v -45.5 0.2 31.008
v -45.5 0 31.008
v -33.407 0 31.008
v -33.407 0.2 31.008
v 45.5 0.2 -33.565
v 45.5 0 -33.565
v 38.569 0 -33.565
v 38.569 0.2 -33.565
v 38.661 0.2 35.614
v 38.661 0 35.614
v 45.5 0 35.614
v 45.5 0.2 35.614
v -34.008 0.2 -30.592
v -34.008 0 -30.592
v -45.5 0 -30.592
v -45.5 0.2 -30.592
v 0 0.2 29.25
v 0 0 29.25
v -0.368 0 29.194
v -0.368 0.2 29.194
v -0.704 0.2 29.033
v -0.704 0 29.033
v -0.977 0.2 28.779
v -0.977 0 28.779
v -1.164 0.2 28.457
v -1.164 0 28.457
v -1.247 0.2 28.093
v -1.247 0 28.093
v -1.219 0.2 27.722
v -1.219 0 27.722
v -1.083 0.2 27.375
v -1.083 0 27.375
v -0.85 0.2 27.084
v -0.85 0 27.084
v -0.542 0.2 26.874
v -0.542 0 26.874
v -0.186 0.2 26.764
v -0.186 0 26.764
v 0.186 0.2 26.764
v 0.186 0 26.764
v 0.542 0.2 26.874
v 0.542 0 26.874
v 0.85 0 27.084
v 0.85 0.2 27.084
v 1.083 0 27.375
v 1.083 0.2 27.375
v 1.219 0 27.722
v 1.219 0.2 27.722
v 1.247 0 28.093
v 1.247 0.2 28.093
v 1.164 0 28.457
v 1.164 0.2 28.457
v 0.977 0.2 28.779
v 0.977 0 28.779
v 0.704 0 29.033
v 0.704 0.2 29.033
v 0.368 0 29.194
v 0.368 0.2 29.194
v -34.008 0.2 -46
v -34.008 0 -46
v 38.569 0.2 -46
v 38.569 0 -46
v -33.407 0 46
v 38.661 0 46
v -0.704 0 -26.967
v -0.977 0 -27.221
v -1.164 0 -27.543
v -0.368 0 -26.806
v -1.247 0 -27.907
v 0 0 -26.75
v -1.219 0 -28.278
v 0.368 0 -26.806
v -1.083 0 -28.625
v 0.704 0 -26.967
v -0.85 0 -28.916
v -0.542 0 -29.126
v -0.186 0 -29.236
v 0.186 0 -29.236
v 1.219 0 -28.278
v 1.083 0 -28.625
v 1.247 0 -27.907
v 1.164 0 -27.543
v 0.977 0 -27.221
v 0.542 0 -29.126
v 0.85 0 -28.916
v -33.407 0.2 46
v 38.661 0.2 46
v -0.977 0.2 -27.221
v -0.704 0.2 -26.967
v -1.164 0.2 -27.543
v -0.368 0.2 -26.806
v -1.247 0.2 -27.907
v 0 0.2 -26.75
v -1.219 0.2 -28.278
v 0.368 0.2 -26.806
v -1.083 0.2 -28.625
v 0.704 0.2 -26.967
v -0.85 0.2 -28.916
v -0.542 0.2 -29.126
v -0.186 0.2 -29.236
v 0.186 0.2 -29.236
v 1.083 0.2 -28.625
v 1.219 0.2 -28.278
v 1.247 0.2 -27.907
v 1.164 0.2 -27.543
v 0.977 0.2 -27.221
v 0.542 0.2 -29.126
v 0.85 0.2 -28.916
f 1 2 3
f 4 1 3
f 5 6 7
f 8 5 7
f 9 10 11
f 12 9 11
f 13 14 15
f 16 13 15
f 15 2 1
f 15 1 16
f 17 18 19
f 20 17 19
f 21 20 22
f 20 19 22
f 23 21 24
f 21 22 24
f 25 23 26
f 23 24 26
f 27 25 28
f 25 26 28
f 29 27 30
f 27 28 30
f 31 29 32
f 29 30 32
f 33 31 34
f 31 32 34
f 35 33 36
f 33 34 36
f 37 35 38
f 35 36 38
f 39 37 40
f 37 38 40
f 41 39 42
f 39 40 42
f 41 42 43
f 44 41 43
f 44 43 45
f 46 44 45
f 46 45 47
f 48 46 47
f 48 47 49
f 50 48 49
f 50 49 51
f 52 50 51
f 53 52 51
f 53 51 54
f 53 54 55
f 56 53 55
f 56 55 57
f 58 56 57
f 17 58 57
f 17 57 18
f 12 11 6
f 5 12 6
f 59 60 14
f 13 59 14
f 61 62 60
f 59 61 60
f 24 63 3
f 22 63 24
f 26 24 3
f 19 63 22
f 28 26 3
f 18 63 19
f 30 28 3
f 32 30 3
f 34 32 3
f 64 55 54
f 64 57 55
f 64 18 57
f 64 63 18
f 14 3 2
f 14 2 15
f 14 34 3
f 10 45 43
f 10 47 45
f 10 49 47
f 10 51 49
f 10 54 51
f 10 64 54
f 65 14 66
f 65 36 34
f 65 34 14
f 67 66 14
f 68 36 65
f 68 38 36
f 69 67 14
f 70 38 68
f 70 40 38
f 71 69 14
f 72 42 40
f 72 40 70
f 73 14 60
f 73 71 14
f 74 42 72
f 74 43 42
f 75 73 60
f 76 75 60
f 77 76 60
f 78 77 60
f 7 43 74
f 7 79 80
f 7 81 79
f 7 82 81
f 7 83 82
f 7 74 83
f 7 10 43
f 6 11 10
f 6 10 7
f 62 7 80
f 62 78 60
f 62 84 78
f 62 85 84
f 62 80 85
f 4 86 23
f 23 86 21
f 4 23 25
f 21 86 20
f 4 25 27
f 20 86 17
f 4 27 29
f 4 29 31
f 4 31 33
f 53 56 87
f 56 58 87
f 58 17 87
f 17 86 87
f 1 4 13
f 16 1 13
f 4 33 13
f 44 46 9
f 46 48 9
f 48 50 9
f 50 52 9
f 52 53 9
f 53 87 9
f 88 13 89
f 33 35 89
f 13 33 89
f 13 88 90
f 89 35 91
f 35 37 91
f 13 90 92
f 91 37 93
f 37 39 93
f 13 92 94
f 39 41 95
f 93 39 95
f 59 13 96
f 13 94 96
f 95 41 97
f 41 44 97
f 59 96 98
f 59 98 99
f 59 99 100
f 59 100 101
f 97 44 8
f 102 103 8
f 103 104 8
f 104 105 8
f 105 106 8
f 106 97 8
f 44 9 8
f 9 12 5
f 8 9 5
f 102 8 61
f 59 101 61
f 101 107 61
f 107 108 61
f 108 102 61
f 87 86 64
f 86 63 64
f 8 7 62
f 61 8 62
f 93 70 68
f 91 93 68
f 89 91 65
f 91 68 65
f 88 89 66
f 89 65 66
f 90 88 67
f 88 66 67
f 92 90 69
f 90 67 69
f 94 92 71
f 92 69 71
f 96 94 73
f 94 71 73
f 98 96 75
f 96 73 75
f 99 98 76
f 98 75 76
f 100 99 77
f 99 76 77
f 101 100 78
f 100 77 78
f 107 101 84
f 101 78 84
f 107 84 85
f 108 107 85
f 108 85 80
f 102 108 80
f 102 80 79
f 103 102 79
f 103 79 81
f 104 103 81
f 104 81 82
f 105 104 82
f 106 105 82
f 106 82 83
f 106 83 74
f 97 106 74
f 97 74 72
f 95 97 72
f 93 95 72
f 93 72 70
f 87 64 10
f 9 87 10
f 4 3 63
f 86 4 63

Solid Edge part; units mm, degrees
sketch "Sketch1" plane through (0, 0, 0) normal (0, -1, 0) x (1, 0, 0)
  line L0 (-47, -47) -> (47, -47)
  line L1 (47, -47) -> (47, 47)
  line L2 (47, 47) -> (-47, 47)
  line L3 (-47, 47) -> (-47, -47)
  dimension "D1" = 47
  dimension "D2" = 47
  dimension "D3" = 47
  dimension "D4" = 47
extrude "Protrusion1" add sketch "Sketch1" against normal blind 0.2
sketch "Sketch2" plane through (0, 0.2, 0) normal (0, 1, 0) x (0, 0, -1)
  line L0 (-31.0077, 45.5) -> (-31.0077, 33.4066)
  line L1 (-31.0077, 33.4066) -> (-46, 33.4066)
  line L2 (-46, 33.4066) -> (-46, -38.6606)
  line L3 (-46, -38.6606) -> (-35.6145, -38.6606)
  line L4 (-35.6145, -38.6606) -> (-35.6145, -45.5)
  line L5 (-35.6145, -45.5) -> (33.5653, -45.5)
  line L6 (33.5653, -45.5) -> (33.5653, -38.5694)
  line L7 (33.5653, -38.5694) -> (46, -38.5694)
  line L8 (46, -38.5694) -> (46, 34.0082)
  line L9 (46, 34.0082) -> (30.5923, 34.0082)
  line L10 (30.5923, 34.0082) -> (30.5923, 44.4526)
  line L11 (30.5923, 45.5) -> (30.5923, 44.4526)
  line L12 (-31.0077, 45.5) -> (30.5923, 45.5)
  dimension "D1" = 1
  dimension "D2" = 1
  dimension "D3" = 1
  dimension "D4" = 1
  dimension "D5" = 1
  dimension "D6" = 1
  dimension "D7" = 1
  dimension "D8" = 1
  dimension "D9" = 1
  dimension "D10" = 1
extrude "Cutout1" cut sketch "Sketch2" along normal mid plane 166.709 flip side to cut
sketch "Sketch3" plane through (0, 0, 0) normal (0, -1, 0) x (0, 0, 1)
  circle A0 centre (28, 0) radius 1.25
  dimension "D1" = 18
extrude "ExtrudedCutout_4" cut sketch "Sketch3" along normal mid plane 10.5197
sketch "Sketch4" plane through (0, 0, 0) normal (0, -1, 0) x (0, 0, 1)
  circle A0 centre (-28, 0) radius 1.25
  dimension "D1" = 18
extrude "ExtrudedCutout_5" cut sketch "Sketch4" along normal mid plane 893.0188
properties material "Copper"
